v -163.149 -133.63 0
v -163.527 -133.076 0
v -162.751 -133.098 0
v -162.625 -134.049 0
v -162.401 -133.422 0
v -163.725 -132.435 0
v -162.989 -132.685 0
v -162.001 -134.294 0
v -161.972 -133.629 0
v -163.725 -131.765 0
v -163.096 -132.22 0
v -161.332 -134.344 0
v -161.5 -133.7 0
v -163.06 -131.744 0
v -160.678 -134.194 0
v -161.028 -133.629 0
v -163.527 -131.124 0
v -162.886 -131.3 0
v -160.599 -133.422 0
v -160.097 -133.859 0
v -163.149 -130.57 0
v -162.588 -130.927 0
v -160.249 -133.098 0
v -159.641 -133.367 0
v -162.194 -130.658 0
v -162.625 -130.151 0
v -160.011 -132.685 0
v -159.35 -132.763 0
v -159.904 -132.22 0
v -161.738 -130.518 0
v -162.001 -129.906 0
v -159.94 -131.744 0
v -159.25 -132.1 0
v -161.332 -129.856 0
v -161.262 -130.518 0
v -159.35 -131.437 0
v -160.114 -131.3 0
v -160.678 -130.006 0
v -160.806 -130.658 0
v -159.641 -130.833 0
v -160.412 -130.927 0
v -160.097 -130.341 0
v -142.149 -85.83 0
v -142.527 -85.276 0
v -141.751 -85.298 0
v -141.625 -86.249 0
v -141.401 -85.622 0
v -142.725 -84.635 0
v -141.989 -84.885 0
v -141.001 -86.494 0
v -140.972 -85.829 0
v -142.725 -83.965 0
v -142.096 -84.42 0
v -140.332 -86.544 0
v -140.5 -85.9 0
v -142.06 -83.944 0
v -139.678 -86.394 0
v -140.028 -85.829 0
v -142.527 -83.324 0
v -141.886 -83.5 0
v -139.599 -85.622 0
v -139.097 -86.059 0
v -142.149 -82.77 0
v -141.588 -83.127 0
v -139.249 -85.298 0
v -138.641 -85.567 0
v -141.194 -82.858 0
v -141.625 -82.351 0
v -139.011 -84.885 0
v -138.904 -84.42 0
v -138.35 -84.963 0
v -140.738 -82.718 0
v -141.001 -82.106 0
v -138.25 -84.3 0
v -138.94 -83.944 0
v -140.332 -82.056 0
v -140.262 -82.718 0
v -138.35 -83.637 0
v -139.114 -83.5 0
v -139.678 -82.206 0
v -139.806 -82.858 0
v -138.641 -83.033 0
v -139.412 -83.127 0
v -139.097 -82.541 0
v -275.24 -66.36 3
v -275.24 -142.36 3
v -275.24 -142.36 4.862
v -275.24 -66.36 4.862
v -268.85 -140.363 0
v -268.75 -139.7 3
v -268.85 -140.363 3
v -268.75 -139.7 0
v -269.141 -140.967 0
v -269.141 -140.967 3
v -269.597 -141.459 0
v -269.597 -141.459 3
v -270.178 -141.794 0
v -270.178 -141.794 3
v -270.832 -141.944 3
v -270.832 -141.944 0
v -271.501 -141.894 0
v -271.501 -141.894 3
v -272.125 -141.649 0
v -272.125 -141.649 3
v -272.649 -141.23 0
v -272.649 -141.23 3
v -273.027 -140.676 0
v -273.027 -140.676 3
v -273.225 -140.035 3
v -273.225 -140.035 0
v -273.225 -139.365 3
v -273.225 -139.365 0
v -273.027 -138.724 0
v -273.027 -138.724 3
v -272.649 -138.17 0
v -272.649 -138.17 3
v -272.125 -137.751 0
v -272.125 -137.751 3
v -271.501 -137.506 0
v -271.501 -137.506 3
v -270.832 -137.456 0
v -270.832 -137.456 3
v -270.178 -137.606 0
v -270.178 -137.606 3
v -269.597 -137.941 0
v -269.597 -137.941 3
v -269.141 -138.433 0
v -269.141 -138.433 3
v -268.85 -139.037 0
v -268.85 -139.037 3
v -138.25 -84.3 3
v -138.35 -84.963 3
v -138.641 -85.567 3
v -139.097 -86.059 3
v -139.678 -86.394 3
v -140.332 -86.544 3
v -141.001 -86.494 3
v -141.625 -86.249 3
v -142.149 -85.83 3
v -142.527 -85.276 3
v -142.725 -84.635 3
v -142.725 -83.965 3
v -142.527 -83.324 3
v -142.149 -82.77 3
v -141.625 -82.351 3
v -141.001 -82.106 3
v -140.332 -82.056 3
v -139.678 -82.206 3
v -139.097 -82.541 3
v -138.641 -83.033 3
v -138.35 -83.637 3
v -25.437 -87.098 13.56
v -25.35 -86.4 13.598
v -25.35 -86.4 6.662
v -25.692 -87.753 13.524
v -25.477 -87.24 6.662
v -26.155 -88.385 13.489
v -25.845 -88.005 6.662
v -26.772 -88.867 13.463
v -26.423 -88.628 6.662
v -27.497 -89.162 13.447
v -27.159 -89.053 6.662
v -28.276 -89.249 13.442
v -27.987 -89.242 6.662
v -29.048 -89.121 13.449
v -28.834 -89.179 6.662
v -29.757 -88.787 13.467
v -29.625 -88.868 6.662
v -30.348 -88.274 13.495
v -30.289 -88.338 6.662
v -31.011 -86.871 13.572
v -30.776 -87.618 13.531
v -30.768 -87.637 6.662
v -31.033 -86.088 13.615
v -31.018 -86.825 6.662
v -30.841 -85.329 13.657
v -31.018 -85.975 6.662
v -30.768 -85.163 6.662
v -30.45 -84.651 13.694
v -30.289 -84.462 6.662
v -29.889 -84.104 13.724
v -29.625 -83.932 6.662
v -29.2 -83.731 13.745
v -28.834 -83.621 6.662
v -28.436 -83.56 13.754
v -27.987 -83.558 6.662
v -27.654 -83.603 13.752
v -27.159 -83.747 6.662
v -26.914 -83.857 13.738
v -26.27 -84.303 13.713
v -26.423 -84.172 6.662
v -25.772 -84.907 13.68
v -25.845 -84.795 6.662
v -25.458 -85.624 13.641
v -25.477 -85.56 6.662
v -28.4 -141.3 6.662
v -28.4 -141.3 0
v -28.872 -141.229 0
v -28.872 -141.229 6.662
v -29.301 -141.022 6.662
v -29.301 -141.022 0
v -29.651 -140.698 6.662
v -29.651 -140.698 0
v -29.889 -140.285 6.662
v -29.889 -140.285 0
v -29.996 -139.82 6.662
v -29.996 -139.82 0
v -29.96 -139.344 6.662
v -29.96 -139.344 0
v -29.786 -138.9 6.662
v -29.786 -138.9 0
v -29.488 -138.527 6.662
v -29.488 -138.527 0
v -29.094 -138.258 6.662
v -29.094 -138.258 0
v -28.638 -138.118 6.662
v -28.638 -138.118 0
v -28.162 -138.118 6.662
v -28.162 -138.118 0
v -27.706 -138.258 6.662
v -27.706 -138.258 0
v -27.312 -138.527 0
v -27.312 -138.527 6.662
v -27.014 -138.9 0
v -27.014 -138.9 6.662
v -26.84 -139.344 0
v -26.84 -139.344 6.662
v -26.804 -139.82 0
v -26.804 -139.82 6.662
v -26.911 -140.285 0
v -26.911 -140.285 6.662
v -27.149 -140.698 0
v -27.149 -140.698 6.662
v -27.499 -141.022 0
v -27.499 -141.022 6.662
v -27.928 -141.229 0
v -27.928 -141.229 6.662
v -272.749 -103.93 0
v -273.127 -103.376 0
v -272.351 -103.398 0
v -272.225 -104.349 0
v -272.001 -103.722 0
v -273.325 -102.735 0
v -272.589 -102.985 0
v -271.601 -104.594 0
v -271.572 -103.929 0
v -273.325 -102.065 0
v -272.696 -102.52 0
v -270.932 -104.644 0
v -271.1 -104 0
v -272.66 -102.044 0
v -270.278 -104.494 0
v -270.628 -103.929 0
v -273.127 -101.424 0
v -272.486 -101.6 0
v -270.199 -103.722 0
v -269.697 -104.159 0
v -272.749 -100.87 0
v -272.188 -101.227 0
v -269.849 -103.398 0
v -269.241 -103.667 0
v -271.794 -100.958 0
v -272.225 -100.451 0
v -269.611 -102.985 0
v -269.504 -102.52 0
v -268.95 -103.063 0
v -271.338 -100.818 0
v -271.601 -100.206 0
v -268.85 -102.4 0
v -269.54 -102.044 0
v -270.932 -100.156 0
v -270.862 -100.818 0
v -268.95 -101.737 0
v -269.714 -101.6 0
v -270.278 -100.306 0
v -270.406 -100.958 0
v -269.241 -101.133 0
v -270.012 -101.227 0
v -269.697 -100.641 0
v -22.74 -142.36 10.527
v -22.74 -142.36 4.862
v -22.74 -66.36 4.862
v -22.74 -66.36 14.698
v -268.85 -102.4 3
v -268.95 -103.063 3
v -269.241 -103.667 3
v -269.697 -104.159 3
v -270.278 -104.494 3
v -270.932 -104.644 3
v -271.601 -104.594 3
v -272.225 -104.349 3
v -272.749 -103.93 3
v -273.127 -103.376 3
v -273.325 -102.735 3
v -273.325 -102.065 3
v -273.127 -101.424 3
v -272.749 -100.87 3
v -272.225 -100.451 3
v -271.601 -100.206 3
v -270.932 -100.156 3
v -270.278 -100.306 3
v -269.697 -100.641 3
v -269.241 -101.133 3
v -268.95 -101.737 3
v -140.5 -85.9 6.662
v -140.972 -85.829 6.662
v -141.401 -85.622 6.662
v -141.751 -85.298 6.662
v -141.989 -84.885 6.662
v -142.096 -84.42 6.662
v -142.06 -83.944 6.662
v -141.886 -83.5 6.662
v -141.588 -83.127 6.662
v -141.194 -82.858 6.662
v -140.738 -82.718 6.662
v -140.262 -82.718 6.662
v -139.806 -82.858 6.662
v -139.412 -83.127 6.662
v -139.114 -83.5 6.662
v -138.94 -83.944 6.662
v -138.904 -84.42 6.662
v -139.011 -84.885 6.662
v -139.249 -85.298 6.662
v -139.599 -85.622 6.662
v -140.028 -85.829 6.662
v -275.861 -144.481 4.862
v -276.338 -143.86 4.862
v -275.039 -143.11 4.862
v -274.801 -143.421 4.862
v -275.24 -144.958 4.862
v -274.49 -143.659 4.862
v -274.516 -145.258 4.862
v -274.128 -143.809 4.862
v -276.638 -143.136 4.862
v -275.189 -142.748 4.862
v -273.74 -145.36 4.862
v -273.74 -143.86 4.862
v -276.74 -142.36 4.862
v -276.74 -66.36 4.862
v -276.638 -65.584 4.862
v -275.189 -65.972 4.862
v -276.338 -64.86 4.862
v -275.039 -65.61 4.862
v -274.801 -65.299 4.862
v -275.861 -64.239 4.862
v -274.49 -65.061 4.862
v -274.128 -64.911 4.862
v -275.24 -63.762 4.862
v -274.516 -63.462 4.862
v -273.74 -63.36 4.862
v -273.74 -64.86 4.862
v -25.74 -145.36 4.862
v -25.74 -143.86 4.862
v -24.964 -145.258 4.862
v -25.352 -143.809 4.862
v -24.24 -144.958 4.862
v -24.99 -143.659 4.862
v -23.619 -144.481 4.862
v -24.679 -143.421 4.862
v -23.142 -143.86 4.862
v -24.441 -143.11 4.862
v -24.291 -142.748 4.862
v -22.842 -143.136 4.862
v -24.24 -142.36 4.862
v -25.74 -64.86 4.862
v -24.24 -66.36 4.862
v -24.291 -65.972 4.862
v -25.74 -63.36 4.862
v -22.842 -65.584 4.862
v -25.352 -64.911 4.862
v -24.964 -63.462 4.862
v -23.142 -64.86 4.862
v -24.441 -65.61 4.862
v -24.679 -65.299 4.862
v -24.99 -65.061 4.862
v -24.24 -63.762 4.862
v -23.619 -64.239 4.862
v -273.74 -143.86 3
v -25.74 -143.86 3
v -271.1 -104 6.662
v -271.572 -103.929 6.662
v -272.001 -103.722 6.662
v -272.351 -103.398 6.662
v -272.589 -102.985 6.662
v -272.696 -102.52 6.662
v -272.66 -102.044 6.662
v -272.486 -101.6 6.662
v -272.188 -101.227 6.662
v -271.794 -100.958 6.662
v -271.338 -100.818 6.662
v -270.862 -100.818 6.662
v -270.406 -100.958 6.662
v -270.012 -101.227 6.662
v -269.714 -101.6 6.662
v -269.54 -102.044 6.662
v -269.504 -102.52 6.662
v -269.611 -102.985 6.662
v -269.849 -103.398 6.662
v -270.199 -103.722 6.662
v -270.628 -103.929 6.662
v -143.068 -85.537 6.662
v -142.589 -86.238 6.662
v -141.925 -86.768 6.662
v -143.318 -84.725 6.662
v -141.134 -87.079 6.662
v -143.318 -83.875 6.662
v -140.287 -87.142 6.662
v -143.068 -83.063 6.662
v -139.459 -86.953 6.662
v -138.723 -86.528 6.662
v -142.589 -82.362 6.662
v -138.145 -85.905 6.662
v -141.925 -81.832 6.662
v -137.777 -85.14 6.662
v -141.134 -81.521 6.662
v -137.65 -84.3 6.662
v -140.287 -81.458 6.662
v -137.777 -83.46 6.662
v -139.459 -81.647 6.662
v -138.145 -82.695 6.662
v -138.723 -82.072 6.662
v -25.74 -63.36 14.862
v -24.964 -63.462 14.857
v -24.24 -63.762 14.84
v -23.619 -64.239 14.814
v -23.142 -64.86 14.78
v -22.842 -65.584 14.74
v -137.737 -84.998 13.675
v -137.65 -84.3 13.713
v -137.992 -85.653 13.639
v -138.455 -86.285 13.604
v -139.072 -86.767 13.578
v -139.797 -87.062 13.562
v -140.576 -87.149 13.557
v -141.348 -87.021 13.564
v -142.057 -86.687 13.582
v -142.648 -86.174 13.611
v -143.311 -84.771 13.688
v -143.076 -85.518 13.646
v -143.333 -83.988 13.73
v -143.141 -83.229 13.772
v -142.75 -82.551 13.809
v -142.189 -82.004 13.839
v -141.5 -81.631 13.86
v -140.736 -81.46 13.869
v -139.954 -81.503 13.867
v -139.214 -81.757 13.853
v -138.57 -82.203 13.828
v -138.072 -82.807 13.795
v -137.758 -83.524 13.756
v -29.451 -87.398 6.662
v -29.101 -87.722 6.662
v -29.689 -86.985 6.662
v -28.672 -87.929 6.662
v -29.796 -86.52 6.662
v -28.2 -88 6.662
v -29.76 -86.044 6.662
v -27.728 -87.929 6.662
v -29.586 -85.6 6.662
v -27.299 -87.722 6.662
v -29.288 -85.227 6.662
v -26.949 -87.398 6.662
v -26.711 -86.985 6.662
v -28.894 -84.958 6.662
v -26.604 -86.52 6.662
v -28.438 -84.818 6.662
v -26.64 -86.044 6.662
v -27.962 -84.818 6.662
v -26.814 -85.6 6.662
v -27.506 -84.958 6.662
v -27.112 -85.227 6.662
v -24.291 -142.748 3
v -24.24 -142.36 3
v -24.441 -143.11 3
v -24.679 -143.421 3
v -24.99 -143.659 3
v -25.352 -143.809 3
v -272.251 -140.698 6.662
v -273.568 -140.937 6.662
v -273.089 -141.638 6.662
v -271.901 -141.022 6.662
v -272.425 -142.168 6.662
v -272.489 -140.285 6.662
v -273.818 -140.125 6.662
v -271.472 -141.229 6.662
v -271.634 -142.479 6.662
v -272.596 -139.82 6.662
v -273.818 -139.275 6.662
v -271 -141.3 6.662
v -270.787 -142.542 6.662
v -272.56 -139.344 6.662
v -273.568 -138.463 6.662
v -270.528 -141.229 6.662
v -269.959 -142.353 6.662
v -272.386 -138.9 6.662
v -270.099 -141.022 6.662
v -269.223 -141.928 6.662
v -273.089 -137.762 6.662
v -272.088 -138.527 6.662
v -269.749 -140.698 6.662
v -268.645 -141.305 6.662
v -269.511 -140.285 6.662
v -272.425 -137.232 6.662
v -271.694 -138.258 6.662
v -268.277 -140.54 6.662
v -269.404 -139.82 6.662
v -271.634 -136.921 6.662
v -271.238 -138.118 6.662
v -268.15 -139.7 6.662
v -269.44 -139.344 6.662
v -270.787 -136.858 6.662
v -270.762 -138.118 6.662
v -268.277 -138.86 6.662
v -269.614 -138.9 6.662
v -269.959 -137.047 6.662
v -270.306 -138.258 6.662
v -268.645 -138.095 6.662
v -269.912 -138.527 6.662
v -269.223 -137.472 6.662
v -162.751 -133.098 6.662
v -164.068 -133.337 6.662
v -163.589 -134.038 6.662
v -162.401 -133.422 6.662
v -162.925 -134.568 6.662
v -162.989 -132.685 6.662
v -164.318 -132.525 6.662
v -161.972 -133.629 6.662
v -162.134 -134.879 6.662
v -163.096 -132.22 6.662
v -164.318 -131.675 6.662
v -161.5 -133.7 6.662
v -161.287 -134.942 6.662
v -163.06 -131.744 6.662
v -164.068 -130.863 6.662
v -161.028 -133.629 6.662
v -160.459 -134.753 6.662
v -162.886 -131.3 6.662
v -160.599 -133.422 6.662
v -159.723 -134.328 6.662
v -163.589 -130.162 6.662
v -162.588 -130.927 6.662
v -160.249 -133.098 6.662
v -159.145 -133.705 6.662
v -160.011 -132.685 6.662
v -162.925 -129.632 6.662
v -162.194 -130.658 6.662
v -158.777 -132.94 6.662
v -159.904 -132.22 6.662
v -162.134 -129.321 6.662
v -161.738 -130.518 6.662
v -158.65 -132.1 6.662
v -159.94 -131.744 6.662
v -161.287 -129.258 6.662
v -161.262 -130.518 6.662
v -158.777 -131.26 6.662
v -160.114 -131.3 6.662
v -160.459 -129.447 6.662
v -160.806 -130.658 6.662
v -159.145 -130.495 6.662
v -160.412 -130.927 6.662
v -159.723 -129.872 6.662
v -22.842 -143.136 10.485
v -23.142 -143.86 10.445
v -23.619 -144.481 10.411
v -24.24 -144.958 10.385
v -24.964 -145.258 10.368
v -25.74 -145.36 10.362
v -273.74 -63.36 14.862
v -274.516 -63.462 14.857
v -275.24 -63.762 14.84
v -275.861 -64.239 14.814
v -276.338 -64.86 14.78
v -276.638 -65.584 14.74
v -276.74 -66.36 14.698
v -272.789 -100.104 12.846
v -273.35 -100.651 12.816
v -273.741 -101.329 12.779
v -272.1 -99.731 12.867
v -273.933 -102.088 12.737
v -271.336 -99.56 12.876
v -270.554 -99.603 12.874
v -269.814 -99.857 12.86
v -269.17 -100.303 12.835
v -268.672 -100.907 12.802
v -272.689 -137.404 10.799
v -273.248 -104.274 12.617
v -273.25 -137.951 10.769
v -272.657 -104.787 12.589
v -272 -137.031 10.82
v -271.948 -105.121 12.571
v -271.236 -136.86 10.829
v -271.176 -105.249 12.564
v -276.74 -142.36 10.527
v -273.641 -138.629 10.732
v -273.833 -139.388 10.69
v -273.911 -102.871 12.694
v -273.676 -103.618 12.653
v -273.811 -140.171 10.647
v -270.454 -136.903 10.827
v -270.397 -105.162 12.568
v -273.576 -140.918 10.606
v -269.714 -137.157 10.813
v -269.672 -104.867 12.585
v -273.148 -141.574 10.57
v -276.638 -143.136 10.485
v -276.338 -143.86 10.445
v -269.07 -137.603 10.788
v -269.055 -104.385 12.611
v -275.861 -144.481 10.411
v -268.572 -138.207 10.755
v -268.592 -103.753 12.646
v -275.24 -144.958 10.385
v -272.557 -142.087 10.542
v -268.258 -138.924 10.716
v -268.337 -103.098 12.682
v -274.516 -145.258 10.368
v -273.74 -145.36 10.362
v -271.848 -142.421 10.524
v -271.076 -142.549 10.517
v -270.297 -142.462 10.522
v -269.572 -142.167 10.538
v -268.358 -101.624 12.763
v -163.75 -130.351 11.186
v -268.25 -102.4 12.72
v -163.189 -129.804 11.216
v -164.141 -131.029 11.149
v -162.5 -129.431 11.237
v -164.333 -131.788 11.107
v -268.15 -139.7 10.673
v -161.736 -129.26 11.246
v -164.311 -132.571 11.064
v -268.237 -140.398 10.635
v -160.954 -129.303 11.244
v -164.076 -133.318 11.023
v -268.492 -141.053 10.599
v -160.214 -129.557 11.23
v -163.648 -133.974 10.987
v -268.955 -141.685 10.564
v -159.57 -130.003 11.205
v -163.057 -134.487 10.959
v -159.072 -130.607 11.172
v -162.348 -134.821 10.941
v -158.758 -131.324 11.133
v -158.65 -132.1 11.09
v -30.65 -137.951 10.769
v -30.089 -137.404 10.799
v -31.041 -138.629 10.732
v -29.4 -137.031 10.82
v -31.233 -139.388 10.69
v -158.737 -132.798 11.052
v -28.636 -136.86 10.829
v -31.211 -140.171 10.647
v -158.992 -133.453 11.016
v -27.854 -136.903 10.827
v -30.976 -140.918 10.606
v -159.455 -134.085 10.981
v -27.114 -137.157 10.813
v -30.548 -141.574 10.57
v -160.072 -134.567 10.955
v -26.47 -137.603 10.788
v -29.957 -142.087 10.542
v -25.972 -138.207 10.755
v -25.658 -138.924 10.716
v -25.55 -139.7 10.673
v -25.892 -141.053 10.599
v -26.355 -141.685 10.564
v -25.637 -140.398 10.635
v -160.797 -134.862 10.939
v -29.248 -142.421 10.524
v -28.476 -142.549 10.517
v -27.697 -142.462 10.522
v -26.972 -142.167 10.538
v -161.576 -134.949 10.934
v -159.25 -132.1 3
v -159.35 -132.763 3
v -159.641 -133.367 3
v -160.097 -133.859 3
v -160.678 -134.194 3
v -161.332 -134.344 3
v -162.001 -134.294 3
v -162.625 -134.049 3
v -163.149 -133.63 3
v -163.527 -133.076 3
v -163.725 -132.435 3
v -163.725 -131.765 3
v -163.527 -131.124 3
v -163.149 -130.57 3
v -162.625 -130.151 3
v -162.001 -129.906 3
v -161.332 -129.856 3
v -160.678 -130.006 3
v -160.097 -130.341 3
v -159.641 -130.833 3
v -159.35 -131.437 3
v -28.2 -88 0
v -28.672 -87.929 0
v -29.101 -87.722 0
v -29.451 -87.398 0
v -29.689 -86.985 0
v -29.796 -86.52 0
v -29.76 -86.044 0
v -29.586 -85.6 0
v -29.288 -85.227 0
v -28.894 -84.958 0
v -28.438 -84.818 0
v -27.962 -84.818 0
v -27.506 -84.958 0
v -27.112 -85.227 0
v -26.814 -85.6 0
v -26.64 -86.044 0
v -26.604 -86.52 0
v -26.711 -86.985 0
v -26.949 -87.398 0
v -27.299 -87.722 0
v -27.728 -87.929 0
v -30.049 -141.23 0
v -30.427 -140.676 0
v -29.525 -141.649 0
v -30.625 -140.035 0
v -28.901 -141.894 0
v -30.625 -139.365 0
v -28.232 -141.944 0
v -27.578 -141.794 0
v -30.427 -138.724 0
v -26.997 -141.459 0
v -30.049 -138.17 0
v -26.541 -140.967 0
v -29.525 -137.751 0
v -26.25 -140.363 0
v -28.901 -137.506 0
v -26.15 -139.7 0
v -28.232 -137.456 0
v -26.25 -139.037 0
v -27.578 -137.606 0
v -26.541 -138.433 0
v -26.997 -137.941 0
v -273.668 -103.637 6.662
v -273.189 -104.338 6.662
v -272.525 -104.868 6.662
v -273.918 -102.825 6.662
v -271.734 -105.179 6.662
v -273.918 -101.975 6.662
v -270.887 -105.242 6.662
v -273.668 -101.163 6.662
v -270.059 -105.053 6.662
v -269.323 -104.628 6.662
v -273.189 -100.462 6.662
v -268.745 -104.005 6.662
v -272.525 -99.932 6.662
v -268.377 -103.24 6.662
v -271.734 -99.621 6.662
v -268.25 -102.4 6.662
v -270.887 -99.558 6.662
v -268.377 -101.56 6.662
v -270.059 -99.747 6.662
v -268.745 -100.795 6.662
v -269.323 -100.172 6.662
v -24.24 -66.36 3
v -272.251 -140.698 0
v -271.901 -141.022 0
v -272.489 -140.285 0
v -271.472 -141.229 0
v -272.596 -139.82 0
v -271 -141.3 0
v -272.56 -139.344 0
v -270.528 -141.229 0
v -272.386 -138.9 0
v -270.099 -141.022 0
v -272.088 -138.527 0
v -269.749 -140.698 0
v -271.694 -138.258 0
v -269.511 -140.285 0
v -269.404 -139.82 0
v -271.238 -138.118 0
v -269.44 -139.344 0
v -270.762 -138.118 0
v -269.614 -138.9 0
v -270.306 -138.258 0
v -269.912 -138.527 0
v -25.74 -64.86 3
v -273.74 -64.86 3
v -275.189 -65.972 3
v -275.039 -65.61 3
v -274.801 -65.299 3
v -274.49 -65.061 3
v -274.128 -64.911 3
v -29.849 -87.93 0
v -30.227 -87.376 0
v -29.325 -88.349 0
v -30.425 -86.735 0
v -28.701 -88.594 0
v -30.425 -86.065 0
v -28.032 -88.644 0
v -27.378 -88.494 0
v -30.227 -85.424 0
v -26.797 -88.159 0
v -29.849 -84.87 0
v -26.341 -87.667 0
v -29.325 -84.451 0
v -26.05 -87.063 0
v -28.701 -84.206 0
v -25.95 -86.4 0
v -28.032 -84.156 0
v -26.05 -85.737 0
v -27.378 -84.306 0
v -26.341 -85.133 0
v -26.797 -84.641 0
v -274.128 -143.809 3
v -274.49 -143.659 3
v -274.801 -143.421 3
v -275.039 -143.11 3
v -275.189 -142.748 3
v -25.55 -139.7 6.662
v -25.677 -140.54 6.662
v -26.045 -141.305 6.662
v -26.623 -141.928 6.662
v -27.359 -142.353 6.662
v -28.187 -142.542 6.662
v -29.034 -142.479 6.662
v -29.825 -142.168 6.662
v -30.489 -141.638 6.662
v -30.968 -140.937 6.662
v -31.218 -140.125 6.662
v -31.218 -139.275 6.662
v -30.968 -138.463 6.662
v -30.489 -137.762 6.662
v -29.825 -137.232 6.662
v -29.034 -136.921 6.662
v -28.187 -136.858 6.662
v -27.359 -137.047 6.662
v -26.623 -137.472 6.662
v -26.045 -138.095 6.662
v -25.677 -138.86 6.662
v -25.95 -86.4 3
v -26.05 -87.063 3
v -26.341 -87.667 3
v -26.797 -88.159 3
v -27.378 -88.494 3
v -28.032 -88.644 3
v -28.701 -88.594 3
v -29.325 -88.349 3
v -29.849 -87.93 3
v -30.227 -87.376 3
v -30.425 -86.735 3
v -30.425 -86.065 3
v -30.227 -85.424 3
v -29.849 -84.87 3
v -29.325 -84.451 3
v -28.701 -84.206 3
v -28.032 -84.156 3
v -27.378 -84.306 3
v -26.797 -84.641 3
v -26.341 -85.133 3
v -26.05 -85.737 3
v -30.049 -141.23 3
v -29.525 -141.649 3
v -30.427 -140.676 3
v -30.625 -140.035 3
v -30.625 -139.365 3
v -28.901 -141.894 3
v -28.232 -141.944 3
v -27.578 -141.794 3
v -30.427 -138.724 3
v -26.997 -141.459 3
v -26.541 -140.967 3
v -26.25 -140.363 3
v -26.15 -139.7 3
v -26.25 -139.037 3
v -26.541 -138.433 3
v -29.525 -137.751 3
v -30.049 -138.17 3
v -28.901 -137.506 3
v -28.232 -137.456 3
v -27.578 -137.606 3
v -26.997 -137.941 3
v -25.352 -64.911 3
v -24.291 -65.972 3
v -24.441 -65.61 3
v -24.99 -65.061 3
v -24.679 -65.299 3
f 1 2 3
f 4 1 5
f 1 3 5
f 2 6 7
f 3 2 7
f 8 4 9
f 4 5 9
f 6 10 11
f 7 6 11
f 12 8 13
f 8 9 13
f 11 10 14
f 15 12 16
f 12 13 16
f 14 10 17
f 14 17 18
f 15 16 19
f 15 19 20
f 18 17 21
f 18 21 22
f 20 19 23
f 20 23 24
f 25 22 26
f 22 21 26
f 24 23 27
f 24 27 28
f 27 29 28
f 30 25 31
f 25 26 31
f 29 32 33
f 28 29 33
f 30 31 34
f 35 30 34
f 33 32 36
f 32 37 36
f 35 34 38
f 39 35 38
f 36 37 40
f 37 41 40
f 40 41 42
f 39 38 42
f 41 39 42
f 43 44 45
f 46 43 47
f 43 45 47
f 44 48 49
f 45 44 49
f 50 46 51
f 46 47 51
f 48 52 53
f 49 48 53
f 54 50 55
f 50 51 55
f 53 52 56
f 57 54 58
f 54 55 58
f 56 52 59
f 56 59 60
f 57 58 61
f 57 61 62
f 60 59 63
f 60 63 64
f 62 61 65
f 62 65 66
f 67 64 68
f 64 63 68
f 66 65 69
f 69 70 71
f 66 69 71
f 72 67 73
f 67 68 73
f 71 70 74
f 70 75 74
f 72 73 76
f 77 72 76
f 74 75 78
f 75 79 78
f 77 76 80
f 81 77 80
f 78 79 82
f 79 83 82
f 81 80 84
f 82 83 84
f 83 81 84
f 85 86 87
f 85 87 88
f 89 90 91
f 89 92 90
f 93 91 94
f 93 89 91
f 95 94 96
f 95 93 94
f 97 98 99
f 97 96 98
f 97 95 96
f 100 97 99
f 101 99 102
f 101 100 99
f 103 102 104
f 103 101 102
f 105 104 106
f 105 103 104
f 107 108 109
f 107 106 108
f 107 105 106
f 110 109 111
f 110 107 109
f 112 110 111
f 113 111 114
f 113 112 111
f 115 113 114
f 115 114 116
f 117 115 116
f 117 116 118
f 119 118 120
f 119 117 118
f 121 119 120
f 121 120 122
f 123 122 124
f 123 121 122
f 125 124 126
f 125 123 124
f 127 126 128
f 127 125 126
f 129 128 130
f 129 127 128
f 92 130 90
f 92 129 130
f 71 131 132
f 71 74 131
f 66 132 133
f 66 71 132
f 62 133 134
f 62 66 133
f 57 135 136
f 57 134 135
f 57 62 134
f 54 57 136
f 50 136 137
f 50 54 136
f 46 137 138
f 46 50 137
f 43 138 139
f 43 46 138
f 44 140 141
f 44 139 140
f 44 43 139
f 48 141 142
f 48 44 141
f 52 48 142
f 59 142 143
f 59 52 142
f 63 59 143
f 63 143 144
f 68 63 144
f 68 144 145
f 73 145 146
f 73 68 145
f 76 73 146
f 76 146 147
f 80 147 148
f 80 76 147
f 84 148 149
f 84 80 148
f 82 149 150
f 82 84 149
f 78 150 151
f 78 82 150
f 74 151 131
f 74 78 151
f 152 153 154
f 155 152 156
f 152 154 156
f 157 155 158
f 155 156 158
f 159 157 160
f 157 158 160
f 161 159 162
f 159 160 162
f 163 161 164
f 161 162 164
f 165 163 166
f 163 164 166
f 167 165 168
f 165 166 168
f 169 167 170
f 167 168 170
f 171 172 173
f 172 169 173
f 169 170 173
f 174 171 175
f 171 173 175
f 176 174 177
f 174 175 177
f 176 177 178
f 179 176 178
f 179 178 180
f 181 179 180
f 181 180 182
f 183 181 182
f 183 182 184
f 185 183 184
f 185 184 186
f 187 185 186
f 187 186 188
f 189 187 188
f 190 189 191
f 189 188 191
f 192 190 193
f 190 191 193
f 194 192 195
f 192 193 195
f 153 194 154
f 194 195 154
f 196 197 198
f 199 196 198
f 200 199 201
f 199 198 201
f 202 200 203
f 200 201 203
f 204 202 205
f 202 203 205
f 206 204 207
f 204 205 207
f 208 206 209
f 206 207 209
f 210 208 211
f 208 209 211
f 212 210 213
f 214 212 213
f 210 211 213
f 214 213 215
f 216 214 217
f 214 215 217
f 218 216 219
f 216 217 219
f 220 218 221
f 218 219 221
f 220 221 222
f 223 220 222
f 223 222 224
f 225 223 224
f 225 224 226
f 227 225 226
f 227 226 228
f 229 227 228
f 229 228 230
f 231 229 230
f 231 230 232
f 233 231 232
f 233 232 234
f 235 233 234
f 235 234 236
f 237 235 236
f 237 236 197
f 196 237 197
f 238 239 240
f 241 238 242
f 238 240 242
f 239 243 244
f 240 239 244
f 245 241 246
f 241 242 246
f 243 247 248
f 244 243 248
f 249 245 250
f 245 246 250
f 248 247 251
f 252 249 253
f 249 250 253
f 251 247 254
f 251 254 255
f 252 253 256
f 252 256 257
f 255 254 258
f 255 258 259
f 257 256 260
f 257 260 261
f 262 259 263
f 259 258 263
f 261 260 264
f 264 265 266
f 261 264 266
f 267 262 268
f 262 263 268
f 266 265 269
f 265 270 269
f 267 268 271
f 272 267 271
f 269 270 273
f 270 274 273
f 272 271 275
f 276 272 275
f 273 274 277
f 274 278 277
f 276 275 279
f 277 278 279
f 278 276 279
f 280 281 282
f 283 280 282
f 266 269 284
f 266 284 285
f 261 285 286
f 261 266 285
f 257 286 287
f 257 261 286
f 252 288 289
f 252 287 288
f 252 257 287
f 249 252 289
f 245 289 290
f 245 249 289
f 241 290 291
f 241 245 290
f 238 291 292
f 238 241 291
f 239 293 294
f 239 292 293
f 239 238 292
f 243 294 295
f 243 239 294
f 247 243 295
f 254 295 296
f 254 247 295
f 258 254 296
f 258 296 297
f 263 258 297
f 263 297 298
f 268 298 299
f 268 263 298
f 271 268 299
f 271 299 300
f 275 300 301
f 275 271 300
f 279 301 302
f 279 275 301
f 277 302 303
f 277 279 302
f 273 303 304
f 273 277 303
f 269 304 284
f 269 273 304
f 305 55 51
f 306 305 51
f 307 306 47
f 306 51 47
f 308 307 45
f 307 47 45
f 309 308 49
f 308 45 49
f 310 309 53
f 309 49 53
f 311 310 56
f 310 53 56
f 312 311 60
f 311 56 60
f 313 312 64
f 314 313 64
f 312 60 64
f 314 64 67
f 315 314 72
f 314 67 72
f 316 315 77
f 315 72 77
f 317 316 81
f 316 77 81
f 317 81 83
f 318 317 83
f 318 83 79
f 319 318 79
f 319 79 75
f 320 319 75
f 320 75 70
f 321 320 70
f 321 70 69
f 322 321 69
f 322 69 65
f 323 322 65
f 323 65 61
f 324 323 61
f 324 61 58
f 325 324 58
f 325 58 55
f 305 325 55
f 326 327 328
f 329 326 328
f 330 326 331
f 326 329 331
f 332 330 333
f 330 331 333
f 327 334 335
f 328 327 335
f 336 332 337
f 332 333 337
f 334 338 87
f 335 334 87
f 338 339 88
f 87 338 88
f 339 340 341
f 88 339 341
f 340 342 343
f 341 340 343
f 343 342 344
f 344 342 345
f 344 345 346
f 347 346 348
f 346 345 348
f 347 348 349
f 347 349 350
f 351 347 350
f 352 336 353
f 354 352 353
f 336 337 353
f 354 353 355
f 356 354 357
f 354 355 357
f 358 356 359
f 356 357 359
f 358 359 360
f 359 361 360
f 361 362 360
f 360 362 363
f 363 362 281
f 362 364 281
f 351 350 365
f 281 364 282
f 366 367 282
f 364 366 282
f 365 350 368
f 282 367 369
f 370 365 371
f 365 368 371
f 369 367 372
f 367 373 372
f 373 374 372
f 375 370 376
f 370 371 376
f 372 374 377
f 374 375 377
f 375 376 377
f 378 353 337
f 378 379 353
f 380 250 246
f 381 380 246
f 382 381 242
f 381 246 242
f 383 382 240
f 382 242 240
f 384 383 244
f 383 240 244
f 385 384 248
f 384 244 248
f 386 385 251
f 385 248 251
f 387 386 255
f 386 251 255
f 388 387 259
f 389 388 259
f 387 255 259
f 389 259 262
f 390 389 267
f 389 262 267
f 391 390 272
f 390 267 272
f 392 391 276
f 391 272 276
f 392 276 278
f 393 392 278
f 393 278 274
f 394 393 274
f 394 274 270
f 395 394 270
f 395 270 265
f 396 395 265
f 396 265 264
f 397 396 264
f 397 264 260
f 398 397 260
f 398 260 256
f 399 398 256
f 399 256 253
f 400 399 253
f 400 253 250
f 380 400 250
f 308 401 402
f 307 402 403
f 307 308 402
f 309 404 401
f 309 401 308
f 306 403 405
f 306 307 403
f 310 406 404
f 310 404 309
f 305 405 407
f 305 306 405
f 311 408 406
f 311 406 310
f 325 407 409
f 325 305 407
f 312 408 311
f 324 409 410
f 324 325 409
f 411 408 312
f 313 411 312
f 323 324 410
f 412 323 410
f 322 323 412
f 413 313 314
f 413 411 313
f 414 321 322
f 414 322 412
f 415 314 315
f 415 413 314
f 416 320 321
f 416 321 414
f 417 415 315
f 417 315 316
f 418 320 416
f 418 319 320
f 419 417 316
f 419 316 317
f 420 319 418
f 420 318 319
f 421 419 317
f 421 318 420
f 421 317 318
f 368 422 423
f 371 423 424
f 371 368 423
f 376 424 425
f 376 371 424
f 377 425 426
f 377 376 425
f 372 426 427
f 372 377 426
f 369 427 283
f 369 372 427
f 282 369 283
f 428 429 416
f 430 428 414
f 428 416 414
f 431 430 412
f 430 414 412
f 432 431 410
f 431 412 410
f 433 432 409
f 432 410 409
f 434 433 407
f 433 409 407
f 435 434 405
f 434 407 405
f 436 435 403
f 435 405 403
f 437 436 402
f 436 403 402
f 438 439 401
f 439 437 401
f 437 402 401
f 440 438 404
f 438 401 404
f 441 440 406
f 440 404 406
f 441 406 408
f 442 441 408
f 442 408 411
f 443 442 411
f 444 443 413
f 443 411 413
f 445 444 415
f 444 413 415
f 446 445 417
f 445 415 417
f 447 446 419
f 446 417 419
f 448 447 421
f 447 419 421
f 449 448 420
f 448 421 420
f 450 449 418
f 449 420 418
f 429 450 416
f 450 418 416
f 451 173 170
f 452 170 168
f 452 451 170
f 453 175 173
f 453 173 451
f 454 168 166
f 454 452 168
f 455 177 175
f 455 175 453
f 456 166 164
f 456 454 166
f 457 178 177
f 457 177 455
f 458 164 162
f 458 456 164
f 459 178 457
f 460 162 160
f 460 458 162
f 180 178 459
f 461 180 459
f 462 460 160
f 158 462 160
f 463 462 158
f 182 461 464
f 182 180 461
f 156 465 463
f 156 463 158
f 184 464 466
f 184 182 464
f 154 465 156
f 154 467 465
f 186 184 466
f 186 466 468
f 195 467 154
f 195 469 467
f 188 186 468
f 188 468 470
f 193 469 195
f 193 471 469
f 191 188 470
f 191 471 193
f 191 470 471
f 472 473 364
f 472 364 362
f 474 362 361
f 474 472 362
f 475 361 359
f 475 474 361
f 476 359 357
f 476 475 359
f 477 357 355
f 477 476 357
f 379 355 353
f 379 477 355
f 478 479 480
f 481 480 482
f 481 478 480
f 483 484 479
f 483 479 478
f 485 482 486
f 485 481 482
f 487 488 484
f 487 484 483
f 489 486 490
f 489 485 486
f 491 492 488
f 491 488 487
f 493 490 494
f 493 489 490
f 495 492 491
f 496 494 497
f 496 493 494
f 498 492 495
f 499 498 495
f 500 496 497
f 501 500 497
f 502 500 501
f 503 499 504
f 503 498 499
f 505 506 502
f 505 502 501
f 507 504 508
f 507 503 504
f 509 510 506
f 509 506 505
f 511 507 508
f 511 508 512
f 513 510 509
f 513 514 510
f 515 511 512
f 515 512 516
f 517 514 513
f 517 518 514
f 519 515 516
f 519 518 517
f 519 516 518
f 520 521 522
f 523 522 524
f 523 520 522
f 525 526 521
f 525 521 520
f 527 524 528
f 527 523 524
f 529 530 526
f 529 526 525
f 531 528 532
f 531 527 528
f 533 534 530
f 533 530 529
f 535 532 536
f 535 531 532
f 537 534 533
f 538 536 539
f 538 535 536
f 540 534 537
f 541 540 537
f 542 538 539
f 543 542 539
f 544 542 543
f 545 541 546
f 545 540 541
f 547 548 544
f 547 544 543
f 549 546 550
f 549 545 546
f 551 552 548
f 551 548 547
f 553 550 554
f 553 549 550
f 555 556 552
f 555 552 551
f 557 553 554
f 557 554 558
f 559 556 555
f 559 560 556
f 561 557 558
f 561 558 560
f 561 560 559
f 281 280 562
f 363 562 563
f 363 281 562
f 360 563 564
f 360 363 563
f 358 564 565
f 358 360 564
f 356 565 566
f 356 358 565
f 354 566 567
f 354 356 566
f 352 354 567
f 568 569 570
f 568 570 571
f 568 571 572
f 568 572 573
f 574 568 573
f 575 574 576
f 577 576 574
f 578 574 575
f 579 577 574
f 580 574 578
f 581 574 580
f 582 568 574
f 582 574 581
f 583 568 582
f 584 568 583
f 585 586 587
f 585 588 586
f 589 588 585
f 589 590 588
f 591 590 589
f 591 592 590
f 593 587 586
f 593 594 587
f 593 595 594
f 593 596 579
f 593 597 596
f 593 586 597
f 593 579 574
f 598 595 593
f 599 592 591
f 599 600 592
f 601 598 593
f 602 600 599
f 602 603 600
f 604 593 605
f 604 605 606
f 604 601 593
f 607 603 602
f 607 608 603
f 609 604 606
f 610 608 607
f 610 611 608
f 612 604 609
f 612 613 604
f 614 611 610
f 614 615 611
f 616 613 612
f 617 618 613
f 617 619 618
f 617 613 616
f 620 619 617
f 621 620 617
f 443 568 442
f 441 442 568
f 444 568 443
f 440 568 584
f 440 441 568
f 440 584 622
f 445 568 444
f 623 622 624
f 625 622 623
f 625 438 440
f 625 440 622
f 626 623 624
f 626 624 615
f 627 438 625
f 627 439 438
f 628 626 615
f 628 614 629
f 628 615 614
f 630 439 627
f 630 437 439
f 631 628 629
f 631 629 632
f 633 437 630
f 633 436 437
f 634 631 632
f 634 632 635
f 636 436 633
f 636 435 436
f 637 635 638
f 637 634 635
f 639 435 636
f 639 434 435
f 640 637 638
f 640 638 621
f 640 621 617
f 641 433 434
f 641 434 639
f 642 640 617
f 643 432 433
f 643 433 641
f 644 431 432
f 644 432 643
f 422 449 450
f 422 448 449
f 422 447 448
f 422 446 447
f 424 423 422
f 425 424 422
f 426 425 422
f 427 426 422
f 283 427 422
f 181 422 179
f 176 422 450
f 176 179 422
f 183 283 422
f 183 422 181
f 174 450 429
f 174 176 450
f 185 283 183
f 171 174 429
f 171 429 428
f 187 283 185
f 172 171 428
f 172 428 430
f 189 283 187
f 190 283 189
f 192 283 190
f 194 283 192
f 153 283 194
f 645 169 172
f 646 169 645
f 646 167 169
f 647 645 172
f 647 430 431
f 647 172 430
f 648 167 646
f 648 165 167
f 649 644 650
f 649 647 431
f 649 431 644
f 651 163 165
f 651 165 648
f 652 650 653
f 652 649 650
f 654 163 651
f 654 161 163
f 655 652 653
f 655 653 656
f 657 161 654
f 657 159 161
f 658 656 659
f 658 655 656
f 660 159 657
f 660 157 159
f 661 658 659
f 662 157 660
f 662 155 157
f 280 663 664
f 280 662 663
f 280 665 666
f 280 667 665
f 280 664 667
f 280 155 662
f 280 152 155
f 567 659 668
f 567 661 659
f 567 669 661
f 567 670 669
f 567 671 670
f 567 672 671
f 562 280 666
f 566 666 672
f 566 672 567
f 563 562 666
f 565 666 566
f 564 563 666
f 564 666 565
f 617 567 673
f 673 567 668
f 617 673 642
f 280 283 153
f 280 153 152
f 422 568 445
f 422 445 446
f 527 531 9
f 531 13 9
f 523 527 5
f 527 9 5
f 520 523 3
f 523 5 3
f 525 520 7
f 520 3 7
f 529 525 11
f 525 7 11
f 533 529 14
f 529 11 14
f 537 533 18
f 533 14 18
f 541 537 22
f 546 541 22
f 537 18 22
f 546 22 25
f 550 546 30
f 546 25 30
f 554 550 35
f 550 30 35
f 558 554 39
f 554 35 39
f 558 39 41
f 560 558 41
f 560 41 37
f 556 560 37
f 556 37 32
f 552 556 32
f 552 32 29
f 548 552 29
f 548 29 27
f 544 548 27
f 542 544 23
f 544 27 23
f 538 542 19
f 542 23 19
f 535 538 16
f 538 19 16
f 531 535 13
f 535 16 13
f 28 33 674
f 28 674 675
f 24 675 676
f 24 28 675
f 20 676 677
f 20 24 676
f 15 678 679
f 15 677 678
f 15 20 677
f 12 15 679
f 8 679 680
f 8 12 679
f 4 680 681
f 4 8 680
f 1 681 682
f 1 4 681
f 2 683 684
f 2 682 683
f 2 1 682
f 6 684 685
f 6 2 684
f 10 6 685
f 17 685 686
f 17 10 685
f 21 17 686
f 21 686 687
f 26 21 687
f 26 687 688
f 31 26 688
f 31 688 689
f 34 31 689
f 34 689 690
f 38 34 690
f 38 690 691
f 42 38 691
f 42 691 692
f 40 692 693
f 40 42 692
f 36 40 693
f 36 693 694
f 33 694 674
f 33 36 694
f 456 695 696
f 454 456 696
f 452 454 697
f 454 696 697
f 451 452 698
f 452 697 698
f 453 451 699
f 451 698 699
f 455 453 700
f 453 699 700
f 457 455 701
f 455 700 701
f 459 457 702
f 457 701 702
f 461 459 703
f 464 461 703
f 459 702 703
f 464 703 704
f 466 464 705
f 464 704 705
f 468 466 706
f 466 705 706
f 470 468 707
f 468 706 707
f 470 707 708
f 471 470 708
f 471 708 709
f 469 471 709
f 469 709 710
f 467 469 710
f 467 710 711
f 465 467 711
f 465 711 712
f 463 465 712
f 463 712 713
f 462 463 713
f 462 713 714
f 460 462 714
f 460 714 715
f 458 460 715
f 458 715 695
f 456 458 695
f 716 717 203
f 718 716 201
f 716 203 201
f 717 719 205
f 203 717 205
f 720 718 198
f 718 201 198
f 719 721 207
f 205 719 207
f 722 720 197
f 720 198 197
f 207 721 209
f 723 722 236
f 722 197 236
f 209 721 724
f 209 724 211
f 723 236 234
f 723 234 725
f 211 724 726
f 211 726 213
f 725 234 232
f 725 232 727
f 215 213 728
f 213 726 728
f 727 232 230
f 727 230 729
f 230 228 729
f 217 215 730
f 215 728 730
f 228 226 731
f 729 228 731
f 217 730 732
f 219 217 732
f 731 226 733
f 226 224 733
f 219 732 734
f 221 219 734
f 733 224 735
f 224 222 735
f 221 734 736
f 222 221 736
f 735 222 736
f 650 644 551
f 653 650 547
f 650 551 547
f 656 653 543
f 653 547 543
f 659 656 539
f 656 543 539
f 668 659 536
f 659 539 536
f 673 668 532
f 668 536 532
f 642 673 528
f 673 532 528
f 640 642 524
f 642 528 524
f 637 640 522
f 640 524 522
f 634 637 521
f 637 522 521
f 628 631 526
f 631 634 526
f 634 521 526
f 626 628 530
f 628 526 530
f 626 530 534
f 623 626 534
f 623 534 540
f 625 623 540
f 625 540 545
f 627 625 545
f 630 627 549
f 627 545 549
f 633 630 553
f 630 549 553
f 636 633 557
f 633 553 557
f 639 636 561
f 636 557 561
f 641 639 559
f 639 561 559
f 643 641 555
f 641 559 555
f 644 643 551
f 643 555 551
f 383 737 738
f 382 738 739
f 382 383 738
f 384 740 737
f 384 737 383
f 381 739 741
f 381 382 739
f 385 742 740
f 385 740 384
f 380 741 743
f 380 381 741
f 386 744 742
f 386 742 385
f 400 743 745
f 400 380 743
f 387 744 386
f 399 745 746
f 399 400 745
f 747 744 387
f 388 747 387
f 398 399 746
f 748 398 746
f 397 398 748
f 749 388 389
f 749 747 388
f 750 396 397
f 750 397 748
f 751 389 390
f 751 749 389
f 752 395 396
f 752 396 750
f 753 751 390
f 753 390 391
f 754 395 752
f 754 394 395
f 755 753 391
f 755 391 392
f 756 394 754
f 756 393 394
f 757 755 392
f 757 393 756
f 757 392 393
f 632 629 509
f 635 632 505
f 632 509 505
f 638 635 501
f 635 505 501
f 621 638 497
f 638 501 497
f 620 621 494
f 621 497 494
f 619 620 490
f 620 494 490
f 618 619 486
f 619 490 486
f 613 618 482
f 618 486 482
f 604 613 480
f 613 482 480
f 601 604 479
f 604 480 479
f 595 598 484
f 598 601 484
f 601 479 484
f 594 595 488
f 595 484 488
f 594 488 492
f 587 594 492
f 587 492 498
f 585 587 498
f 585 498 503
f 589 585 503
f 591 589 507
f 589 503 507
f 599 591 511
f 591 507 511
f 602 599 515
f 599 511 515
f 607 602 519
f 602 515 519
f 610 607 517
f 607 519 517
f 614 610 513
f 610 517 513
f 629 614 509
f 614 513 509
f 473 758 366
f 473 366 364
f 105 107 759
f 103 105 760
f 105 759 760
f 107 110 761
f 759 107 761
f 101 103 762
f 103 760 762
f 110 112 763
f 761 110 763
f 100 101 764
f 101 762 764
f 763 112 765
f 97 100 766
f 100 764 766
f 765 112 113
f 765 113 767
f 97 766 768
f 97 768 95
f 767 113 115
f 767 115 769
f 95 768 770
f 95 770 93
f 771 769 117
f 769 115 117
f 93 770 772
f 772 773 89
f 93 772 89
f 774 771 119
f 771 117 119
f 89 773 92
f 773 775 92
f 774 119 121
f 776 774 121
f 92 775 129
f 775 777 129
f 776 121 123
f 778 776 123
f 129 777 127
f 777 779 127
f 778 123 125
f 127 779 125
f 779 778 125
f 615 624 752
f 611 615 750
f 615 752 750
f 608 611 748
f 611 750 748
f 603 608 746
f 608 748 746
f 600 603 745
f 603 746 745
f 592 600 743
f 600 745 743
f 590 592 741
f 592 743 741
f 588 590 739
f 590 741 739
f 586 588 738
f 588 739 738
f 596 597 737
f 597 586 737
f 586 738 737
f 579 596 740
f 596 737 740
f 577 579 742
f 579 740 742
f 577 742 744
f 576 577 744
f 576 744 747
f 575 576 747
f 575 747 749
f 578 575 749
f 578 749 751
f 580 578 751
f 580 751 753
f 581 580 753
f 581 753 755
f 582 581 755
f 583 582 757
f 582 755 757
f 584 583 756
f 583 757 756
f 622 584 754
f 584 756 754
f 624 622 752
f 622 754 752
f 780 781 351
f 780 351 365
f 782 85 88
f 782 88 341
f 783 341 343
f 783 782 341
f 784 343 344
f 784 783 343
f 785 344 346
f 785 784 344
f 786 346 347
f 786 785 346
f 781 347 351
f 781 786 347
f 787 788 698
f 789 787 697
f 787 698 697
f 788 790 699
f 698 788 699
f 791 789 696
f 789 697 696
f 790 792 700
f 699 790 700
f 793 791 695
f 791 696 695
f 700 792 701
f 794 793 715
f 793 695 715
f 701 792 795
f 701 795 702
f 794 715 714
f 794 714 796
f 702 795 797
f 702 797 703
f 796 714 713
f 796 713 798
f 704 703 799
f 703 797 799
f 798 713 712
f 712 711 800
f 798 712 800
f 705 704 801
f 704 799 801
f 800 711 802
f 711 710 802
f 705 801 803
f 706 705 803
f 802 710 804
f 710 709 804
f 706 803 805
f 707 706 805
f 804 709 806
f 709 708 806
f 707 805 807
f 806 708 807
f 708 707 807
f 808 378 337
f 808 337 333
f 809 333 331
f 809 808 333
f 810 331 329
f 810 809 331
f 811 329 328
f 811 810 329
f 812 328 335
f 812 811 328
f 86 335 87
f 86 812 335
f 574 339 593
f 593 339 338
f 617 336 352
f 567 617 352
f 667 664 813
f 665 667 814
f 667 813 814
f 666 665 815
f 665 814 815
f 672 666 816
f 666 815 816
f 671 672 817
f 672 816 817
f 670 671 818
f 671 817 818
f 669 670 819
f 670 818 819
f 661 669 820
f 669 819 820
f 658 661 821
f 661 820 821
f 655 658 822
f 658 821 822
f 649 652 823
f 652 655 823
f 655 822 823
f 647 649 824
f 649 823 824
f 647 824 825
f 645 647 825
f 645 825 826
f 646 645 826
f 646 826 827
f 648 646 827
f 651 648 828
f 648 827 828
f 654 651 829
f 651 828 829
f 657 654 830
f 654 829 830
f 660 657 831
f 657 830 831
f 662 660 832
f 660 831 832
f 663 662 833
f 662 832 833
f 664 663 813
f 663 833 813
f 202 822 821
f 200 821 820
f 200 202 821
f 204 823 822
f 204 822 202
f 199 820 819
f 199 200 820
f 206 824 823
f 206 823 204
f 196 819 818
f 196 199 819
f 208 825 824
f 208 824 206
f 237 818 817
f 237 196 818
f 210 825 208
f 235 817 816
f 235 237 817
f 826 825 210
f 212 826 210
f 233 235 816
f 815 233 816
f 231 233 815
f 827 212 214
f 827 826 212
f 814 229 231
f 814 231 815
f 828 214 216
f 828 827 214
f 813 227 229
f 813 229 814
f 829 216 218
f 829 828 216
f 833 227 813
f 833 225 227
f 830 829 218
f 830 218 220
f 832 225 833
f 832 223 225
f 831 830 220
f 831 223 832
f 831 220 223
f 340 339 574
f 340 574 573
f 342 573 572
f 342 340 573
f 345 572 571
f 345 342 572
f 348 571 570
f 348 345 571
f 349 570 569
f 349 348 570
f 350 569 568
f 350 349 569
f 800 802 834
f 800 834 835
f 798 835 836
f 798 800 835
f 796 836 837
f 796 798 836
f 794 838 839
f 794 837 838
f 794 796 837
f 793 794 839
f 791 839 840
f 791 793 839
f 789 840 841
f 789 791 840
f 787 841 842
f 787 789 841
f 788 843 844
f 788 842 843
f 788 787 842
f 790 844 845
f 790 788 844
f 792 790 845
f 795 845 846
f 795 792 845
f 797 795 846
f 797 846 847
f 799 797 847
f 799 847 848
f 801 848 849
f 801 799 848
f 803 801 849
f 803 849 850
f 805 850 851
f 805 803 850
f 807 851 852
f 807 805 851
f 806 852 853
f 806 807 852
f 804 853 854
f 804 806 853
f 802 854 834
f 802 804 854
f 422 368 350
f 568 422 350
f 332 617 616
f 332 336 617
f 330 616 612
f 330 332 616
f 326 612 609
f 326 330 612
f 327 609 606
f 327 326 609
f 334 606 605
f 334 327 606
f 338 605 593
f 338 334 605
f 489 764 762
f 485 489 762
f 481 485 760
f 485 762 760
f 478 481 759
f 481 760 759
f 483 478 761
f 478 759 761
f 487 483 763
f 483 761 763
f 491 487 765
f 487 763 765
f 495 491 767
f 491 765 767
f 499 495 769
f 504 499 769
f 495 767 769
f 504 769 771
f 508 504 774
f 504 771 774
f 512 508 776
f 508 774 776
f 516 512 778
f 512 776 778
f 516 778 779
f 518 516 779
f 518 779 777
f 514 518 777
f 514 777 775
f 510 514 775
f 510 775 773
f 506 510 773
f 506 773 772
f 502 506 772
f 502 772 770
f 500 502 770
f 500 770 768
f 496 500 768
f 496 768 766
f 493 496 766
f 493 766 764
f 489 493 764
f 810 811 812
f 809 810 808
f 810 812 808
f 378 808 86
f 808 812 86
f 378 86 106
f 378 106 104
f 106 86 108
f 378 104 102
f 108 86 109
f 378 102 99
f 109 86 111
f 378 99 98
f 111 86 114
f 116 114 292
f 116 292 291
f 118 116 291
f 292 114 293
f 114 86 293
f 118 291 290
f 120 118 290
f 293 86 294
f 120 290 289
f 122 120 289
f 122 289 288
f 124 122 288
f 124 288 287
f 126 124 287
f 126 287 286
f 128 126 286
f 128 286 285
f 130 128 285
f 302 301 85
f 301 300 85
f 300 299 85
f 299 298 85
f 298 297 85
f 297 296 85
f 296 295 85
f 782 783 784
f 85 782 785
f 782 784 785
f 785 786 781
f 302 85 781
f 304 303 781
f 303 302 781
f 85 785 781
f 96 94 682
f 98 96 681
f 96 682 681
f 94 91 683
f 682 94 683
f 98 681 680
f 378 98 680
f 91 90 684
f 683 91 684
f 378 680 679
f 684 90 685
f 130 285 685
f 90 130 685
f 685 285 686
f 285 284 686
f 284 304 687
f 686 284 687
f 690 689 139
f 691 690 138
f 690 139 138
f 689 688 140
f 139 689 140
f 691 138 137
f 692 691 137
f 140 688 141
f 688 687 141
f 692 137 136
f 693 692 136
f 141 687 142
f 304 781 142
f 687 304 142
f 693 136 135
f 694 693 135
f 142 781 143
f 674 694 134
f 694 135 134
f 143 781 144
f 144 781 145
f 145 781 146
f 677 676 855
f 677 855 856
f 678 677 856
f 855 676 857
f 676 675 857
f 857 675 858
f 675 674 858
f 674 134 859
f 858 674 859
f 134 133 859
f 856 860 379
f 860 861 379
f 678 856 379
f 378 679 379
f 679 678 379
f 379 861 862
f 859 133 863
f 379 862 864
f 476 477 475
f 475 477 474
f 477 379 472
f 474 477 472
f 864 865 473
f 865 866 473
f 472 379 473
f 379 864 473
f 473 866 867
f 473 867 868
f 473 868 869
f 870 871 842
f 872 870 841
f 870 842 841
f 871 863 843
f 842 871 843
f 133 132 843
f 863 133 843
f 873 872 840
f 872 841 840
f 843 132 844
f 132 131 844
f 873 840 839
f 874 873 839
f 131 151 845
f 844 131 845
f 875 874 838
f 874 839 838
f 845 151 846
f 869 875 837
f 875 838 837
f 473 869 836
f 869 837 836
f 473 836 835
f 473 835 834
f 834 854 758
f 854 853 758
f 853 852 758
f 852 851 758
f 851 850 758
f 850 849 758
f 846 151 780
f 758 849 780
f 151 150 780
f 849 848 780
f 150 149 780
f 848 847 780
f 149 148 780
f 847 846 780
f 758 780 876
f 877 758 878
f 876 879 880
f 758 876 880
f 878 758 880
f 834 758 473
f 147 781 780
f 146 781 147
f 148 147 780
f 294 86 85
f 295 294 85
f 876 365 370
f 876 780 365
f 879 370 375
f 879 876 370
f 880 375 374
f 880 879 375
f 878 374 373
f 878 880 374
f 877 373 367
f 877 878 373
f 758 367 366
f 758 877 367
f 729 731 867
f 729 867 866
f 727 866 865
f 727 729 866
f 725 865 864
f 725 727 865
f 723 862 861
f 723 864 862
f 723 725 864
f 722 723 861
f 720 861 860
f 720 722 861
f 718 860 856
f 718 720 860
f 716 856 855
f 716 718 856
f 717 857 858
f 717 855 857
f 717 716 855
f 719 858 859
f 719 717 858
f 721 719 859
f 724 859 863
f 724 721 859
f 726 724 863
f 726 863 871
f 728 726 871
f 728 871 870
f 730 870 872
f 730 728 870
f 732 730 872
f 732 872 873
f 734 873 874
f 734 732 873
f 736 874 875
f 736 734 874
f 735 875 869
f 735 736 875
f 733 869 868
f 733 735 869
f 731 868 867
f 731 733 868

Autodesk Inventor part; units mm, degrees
ref_plane "YZ Plane" through (0, 0, 0) normal (1, 0, 0) x (0, 1, 0)
ref_plane "XZ Plane" through (0, 0, 0) normal (0, 1, 0) x (-1, 0, 0)
sketch "Skizze1" plane through (0, 0, 0) normal (0, 0, 1) x (1, 0, 0)
  circle A0 centre (-271.1, -102.4) radius 2.25
  circle A1 centre (-271, -139.7) radius 2.25
  circle A2 centre (-140.5, -84.3) radius 2.25
  circle A3 centre (-161.5, -132.1) radius 2.25
  circle A4 centre (-28.4, -139.7) radius 2.25
  circle A5 centre (-28.2, -86.4) radius 2.25
  circle A6 centre (-216.6, -72.6) radius 2.25
  point P0 (0, 0)
extrude "Extrusion1" add sketch "Skizze1" along normal blind 3 contours A0 | A1 | A2 | A3 | A4 | A5
sketch "Skizze2" plane through (-216.6, -72.6, 3) normal (0, 0, 1) x (1, 0, 0)
  line L0 (-57.14, 7.74) -> (190.86, 7.74) projected
  arc A0 (192.36, 6.24) -> (190.86, 7.74) centre (190.86, 6.24) ccw projected
  line L1 (192.36, 6.24) -> (192.36, -69.76) projected
  arc A1 (190.86, -71.26) -> (192.36, -69.76) centre (190.86, -69.76) ccw projected
  line L2 (190.86, -71.26) -> (-57.14, -71.26) projected
  arc A2 (-58.64, -69.76) -> (-57.14, -71.26) centre (-57.14, -69.76) ccw projected
  line L3 (-58.64, -69.76) -> (-58.64, 6.24) projected
  arc A3 (-57.14, 7.74) -> (-58.64, 6.24) centre (-57.14, 6.24) ccw projected
  point P0 (216.6, 72.6)
ref_plane "Arbeitsebene1" through (-276.74, -145.36, 4.8625) normal (0, 0, 1) x (1, 0, 0)
extrude "Extrusion2" add sketch "Skizze2" along normal up to surface (1.8625 mm away)
sketch "Skizze3" plane through (-273.74, -143.86, 4.8625) normal (0, 0, 1) x (1, 0, 0)
  line L0 (248, 80.5) -> (0, 80.5) projected
  arc A0 (0, 80.5) -> (-3, 77.5) centre (0, 77.5) ccw projected
  line L1 (-3, 77.5) -> (-3, 1.5) projected
  arc A1 (-3, 1.5) -> (0, -1.5) centre (0, 1.5) ccw projected
  line L2 (0, -1.5) -> (248, -1.5) projected
  arc A2 (248, -1.5) -> (251, 1.5) centre (248, 1.5) ccw projected
  line L3 (251, 1.5) -> (251, 77.5) projected
  arc A3 (251, 77.5) -> (248, 80.5) centre (248, 77.5) ccw projected
  point P0 (273.74, 143.86)
extrude "Extrusion3" add sketch "Skizze3" along normal blind 5
sketch "Skizze4" plane through (-273.74, -143.86, 9.8625) normal (0, 0, 1) x (1, 0, 0)
  circle A0 centre (245.54, 57.46) radius 2.25 construction
  circle A1 centre (245.34, 4.16) radius 2.25 construction
  circle A2 centre (133.24, 59.56) radius 1.2295 projected
  circle A3 centre (133.24, 59.56) radius 1.2295 projected
  circle A4 centre (112.24, 11.76) radius 1.6 projected
  circle A5 centre (57.14, 71.26) radius 2.25 projected
  circle A6 centre (2.64, 41.46) radius 1.2295 projected
  circle A7 centre (2.74, 4.16) radius 1.2295 projected
  circle A8 centre (2.64, 41.46) radius 2.85
  circle A9 centre (2.74, 4.16) radius 2.85
  circle A10 centre (57.14, 71.26) radius 2.85
  circle A11 centre (112.24, 11.76) radius 2.25 projected
  circle A12 centre (112.24, 11.76) radius 2.85
  circle A13 centre (133.24, 59.56) radius 2.25 projected
  circle A14 centre (133.24, 59.56) radius 2.85
  circle A15 centre (245.54, 57.46) radius 2.85
  circle A16 centre (245.34, 4.16) radius 2.85
  point P0 (273.74, 143.86)
  dimension "d6" = 5.7
  dimension "d7" = 5.7
  dimension "d8" = 5.7
  dimension "d9" = 5.7
  dimension "d10" = 5.7
  dimension "d11" = 5.7
  dimension "d12" = 5.7
extrude "Extrusion4" cut sketch "Skizze4" against normal blind 3.2 contours A2 | A4 | A6 | A7 | A8 | A9 | A11 | A12 | A13 | A14 | A15 | A16
sketch "Skizze5" plane through (-273.74, -143.86, 9.8625) normal (0, 0, 1) x (1, 0, 0)
  circle A0 centre (245.54, 57.46) radius 2.85 projected
  circle A1 centre (245.34, 4.16) radius 2.85 projected
  circle A2 centre (112.24, 11.76) radius 2.85 projected
  circle A3 centre (133.24, 59.56) radius 2.85 projected
  circle A4 centre (57.14, 71.26) radius 2.85 projected
  circle A5 centre (2.64, 41.46) radius 2.85 projected
  circle A6 centre (2.74, 4.16) radius 2.85 projected
  point P0 (273.74, 143.86)
hole "Bohrung1" at (-271, -139.7, 9.8625) at (-271.1, -102.4, 9.8625) at (-161.5, -132.1, 9.8625) at (-140.5, -84.3, 9.8625) at (-28.2, -86.4, 9.8625) at (-28.4, -139.7, 9.8625) direction (0, 0, -1) diameter 3.2 depth 23.862
sketch "Skizze6" plane through (-273.74, -143.86, 9.8625) normal (0, 0, 1) x (1, 0, 0)
  circle A0 centre (245.54, 57.46) radius 2.85 projected
  circle A1 centre (112.24, 11.76) radius 2.85 projected
  circle A2 centre (2.74, 4.16) radius 2.85 projected
  circle A3 centre (245.34, 4.16) radius 2.85 projected
  circle A4 centre (133.24, 59.56) radius 2.85 projected
  circle A5 centre (2.64, 41.46) radius 2.85 projected
  arc A6 (0, 80.5) -> (-3, 77.5) centre (0, 77.5) ccw projected
  line L0 (-3, 77.5) -> (-3, 1.5) projected
  arc A7 (-3, 1.5) -> (0, -1.5) centre (0, 1.5) ccw projected
  line L1 (0, -1.5) -> (248, -1.5) projected
  arc A8 (248, -1.5) -> (251, 1.5) centre (248, 1.5) ccw projected
  line L2 (251, 1.5) -> (251, 77.5) projected
  arc A9 (251, 77.5) -> (248, 80.5) centre (248, 77.5) ccw projected
  line L3 (248, 80.5) -> (0, 80.5) projected
  point P0 (273.74, 143.86)
extrude "Extrusion5" add sketch "Skizze6" along normal blind 5
sketch "Skizze7" plane through (-22.74, -142.36, 4.8625) normal (1, 0, 0) x (0, 0, -1)
  line L0 (-10, 0) -> (-10, 76) projected
  line L1 (-10, 0) -> (-10, -3) projected
  line L2 (0, -3) -> (-10, -3) projected
  line L3 (0, 79) -> (-10, 79) projected
  line L4 (-10, 79) -> (-10, 76) projected
  line L5 (-10, 79) -> (-5.5, -3)
  point P0 (4.8625, 142.36)
  dimension "d27" = 4.5
extrude "Extrusion6" cut sketch "Skizze7" against normal through all
properties part number "Bottom"
